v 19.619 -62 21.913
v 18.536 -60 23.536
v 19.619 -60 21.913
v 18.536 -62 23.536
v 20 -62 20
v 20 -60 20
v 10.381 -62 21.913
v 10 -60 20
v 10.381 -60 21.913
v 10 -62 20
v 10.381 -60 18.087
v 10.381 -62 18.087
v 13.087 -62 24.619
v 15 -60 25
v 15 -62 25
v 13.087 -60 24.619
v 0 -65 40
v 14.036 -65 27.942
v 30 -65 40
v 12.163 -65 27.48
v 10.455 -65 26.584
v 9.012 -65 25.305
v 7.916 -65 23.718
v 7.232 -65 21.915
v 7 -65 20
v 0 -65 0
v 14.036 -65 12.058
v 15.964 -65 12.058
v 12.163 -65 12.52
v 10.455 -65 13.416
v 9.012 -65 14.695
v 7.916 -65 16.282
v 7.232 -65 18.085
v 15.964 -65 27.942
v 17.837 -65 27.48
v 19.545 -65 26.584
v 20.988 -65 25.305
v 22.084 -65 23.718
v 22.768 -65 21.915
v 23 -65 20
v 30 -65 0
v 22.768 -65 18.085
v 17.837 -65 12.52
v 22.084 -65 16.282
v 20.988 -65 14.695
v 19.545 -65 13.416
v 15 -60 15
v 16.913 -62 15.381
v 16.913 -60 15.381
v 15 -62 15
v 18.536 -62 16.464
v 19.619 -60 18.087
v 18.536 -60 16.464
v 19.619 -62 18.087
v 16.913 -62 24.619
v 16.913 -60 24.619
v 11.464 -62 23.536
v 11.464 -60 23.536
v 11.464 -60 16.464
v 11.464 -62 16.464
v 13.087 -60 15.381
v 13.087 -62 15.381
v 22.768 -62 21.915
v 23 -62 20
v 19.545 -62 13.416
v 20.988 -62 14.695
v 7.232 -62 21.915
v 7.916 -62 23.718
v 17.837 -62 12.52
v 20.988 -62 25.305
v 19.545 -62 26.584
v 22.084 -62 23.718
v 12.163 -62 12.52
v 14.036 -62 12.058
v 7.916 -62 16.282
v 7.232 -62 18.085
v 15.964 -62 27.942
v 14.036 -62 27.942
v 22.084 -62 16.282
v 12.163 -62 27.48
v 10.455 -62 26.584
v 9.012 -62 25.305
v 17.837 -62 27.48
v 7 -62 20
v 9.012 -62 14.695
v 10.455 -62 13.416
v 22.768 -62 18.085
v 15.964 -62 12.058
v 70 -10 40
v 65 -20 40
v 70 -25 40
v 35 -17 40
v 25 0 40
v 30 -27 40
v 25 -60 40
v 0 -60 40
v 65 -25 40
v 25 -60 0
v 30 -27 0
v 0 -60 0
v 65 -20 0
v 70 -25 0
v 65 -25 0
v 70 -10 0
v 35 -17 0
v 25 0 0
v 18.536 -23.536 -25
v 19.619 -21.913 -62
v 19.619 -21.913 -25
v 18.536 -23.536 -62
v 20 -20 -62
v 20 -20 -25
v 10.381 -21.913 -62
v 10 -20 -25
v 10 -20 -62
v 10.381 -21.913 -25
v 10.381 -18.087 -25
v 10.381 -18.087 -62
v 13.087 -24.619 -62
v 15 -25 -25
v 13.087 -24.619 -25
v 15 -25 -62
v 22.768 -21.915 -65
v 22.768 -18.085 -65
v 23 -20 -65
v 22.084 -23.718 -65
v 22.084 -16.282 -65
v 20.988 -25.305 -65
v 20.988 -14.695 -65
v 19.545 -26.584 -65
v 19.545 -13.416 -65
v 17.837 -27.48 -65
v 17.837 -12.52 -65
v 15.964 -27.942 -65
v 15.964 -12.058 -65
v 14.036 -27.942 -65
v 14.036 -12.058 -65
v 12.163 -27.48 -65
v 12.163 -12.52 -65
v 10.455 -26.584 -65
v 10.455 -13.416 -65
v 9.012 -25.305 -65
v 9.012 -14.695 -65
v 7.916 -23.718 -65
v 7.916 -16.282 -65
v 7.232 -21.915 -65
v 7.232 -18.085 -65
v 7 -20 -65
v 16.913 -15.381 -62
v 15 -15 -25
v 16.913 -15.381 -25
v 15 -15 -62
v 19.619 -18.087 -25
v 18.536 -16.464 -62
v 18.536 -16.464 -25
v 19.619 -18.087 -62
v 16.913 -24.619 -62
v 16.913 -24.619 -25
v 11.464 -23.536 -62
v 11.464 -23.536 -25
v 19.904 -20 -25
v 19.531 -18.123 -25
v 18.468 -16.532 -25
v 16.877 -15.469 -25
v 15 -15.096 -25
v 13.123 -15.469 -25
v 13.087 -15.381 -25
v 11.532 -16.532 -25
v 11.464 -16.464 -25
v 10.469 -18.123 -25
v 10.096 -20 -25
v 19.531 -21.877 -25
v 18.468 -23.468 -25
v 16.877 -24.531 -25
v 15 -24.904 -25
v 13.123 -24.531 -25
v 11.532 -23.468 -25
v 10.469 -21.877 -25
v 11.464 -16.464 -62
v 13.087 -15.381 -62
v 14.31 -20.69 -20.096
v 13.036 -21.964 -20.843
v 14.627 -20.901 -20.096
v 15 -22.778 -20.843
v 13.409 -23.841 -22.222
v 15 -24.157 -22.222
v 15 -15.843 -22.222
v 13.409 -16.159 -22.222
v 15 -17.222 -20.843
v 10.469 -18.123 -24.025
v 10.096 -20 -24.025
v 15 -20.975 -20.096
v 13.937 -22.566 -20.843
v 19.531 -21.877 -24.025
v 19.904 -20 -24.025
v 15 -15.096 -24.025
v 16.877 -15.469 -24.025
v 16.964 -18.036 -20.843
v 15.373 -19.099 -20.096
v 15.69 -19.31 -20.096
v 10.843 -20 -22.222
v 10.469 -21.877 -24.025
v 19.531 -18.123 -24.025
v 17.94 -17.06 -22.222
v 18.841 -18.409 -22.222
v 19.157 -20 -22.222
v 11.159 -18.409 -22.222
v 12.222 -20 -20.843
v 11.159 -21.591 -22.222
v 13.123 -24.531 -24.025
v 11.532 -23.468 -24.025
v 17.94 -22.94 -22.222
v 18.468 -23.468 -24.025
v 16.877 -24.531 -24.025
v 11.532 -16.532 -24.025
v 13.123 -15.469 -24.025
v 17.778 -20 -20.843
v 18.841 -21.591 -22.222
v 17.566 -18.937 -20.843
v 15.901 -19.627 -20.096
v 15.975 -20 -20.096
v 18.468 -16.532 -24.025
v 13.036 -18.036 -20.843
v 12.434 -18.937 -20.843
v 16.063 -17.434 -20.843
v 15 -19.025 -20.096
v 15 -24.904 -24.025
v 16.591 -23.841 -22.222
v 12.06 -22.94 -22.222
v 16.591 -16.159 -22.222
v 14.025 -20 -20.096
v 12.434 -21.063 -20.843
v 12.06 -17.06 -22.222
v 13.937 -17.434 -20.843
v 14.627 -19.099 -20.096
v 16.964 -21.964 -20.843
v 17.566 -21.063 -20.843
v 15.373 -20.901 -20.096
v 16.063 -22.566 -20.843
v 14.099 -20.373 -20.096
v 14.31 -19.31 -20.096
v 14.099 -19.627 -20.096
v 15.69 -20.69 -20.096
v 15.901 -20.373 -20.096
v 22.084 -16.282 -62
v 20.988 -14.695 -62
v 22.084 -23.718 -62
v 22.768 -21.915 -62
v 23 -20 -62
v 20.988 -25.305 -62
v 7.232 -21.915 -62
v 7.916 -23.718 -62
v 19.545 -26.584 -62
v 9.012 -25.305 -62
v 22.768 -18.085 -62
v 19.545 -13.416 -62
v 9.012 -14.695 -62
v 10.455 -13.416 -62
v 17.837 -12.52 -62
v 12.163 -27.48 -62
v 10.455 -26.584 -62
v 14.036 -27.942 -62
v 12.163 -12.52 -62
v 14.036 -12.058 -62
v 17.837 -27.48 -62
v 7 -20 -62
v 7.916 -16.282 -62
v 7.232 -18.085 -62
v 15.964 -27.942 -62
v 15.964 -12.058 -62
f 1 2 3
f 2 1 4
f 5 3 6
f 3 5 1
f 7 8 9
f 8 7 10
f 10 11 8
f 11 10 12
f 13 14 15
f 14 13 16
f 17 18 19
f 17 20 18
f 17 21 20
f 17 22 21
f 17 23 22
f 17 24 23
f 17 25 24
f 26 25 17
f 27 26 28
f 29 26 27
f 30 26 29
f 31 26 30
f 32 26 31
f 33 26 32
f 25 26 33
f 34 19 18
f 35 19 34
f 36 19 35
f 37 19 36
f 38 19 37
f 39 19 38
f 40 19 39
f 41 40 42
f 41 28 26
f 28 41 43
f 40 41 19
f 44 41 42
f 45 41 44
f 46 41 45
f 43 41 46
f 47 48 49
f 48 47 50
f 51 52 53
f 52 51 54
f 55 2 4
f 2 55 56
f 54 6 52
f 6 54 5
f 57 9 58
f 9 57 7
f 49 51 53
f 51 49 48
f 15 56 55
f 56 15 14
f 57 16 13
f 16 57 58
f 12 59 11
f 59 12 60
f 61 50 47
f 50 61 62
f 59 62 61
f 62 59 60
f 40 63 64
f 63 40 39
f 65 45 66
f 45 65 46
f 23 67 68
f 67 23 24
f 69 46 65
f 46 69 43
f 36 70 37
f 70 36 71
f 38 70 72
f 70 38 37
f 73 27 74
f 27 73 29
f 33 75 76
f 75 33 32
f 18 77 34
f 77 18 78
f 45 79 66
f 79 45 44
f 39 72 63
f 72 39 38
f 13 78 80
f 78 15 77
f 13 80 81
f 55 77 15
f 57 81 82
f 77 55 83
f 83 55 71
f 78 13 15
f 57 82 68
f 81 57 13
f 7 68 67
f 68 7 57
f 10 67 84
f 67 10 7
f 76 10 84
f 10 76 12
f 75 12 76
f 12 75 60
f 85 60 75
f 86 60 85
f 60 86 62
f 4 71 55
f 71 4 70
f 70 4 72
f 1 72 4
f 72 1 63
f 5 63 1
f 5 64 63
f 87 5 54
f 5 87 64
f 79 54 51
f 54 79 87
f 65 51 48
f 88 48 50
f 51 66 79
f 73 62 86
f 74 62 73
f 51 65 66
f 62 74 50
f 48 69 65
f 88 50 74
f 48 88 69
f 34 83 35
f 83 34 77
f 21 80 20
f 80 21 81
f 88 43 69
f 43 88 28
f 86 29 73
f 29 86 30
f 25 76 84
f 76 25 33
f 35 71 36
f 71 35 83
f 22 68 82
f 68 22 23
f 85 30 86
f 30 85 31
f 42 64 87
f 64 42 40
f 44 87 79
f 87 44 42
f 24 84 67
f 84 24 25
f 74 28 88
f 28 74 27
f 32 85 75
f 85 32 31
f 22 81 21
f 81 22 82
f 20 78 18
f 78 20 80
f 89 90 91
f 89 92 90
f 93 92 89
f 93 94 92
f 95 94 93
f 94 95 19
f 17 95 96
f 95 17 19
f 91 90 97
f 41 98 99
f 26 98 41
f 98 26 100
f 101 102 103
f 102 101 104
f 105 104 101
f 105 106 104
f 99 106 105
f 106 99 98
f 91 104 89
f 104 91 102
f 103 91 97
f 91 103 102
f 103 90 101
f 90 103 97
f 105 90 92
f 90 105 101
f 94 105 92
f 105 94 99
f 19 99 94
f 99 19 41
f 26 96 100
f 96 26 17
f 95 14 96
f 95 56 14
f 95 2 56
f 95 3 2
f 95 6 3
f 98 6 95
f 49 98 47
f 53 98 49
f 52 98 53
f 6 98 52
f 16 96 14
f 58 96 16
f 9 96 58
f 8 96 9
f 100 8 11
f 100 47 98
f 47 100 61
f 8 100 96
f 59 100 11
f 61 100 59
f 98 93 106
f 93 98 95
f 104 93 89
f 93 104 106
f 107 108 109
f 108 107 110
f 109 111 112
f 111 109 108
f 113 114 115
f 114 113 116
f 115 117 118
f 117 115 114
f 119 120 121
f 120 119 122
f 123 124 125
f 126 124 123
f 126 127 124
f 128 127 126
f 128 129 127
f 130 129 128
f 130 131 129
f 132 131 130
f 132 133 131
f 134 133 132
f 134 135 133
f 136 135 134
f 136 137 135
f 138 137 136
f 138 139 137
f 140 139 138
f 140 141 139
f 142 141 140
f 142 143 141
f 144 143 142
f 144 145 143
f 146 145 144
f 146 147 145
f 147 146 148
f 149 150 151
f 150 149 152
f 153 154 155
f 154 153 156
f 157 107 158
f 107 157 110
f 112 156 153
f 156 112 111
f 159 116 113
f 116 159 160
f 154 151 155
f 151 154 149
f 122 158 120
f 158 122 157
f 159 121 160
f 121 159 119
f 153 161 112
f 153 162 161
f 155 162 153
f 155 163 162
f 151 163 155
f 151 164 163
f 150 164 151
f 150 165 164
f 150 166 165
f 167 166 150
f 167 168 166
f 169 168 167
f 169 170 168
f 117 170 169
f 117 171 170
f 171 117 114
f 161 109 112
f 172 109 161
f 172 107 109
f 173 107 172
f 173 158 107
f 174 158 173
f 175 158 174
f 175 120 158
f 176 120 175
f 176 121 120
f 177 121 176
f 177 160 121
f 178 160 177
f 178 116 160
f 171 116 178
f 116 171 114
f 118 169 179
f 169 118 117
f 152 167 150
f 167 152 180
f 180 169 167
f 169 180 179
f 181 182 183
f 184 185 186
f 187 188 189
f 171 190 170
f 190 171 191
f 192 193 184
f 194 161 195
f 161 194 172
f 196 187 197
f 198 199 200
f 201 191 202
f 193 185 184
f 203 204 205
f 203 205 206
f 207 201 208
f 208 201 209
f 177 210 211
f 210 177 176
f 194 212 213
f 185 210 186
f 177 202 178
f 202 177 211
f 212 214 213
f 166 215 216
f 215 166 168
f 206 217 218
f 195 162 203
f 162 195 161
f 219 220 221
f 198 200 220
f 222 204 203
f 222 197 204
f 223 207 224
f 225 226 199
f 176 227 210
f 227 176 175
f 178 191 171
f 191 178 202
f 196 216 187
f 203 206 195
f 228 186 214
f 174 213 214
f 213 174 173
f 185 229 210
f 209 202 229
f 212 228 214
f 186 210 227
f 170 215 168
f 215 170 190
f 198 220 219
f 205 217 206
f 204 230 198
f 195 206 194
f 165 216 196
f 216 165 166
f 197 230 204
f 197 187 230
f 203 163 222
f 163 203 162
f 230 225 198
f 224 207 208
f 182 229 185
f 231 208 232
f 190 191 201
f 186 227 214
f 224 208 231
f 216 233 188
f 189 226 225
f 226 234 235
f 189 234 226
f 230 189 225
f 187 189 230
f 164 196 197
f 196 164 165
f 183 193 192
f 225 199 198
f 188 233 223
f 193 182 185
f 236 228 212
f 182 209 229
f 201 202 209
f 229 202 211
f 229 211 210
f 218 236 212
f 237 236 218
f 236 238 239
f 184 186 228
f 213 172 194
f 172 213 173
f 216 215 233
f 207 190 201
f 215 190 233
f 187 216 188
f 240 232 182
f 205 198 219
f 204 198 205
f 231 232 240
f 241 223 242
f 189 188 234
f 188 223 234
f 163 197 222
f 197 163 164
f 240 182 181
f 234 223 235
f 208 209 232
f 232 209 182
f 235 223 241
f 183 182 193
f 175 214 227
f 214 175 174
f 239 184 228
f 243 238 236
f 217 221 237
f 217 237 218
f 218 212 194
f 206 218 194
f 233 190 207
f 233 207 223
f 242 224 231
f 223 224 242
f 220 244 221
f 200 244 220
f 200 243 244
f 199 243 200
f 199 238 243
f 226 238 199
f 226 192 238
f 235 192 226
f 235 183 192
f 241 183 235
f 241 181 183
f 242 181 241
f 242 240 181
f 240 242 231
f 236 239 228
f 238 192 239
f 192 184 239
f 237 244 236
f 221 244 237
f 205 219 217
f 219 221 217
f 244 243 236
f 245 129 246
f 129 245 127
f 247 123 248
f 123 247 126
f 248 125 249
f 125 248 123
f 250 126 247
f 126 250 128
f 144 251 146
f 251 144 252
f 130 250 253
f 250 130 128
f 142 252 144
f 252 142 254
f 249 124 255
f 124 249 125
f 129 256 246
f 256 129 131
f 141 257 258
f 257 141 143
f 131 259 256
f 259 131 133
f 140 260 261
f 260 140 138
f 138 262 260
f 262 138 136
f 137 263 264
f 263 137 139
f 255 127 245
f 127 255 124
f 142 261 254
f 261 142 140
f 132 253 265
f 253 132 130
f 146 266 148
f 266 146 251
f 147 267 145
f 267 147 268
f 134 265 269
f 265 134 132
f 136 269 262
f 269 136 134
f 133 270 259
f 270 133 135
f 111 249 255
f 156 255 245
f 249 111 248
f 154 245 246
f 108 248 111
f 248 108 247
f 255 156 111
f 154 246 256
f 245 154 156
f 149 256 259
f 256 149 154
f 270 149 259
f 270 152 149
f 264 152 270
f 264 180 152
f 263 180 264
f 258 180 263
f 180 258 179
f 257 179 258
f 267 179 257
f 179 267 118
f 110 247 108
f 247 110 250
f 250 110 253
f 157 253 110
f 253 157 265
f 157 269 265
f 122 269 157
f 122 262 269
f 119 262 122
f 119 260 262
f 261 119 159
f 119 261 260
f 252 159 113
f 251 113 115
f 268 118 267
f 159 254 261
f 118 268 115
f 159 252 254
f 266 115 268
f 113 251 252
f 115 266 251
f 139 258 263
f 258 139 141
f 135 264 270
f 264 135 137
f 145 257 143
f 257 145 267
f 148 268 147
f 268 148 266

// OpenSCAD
px0=0;
px1=25;
px2=px1+5;
px2a=px2+5;
px3=65;
px4=px3+5;
py0=0;
py1=10;
py2=17;
py2a=py2+10;
py3=20;
py4=25;
py5=60;
py6=py5+5;

width=40;
sheight=40;
srad=5;

rotate([90,0,0]) {
    difference() {
        translate ([0,width,0]) {
            rotate ([90,0,0]) {
                linear_extrude(width) {
                    polygon(points=[[px1,py0],[px4,py1],
                                [px4,py4],[px3,py4],
                                [px3,py3],[px2a,py2],[px2,py2a],
                                [px2,py6],[px0,py6],
                                [px0,py5],[px1,py5]],convexity = 0);
                    cylinder(1,2,2,center=true); 
                }
            }
        }
        rotate([0,0,0]) {
            translate([px1-5-srad,width/2,py6-sheight]) {
                cylinder(sheight,srad,srad);
                sphere(srad);
            }

  
            translate([px1-5-srad,width/2,py6-3]) {
                cylinder(3,srad+3,srad+3);
            }
        }
    }
}

rotate([180,0,0]) {
    translate([px1-5-srad,width/2,py6-sheight]) {
        cylinder(sheight,srad,srad);
        sphere(srad);
    }
    translate([px1-5-srad,width/2,py6-3]) {
        cylinder(3,srad+3,srad+3);
    }
}
